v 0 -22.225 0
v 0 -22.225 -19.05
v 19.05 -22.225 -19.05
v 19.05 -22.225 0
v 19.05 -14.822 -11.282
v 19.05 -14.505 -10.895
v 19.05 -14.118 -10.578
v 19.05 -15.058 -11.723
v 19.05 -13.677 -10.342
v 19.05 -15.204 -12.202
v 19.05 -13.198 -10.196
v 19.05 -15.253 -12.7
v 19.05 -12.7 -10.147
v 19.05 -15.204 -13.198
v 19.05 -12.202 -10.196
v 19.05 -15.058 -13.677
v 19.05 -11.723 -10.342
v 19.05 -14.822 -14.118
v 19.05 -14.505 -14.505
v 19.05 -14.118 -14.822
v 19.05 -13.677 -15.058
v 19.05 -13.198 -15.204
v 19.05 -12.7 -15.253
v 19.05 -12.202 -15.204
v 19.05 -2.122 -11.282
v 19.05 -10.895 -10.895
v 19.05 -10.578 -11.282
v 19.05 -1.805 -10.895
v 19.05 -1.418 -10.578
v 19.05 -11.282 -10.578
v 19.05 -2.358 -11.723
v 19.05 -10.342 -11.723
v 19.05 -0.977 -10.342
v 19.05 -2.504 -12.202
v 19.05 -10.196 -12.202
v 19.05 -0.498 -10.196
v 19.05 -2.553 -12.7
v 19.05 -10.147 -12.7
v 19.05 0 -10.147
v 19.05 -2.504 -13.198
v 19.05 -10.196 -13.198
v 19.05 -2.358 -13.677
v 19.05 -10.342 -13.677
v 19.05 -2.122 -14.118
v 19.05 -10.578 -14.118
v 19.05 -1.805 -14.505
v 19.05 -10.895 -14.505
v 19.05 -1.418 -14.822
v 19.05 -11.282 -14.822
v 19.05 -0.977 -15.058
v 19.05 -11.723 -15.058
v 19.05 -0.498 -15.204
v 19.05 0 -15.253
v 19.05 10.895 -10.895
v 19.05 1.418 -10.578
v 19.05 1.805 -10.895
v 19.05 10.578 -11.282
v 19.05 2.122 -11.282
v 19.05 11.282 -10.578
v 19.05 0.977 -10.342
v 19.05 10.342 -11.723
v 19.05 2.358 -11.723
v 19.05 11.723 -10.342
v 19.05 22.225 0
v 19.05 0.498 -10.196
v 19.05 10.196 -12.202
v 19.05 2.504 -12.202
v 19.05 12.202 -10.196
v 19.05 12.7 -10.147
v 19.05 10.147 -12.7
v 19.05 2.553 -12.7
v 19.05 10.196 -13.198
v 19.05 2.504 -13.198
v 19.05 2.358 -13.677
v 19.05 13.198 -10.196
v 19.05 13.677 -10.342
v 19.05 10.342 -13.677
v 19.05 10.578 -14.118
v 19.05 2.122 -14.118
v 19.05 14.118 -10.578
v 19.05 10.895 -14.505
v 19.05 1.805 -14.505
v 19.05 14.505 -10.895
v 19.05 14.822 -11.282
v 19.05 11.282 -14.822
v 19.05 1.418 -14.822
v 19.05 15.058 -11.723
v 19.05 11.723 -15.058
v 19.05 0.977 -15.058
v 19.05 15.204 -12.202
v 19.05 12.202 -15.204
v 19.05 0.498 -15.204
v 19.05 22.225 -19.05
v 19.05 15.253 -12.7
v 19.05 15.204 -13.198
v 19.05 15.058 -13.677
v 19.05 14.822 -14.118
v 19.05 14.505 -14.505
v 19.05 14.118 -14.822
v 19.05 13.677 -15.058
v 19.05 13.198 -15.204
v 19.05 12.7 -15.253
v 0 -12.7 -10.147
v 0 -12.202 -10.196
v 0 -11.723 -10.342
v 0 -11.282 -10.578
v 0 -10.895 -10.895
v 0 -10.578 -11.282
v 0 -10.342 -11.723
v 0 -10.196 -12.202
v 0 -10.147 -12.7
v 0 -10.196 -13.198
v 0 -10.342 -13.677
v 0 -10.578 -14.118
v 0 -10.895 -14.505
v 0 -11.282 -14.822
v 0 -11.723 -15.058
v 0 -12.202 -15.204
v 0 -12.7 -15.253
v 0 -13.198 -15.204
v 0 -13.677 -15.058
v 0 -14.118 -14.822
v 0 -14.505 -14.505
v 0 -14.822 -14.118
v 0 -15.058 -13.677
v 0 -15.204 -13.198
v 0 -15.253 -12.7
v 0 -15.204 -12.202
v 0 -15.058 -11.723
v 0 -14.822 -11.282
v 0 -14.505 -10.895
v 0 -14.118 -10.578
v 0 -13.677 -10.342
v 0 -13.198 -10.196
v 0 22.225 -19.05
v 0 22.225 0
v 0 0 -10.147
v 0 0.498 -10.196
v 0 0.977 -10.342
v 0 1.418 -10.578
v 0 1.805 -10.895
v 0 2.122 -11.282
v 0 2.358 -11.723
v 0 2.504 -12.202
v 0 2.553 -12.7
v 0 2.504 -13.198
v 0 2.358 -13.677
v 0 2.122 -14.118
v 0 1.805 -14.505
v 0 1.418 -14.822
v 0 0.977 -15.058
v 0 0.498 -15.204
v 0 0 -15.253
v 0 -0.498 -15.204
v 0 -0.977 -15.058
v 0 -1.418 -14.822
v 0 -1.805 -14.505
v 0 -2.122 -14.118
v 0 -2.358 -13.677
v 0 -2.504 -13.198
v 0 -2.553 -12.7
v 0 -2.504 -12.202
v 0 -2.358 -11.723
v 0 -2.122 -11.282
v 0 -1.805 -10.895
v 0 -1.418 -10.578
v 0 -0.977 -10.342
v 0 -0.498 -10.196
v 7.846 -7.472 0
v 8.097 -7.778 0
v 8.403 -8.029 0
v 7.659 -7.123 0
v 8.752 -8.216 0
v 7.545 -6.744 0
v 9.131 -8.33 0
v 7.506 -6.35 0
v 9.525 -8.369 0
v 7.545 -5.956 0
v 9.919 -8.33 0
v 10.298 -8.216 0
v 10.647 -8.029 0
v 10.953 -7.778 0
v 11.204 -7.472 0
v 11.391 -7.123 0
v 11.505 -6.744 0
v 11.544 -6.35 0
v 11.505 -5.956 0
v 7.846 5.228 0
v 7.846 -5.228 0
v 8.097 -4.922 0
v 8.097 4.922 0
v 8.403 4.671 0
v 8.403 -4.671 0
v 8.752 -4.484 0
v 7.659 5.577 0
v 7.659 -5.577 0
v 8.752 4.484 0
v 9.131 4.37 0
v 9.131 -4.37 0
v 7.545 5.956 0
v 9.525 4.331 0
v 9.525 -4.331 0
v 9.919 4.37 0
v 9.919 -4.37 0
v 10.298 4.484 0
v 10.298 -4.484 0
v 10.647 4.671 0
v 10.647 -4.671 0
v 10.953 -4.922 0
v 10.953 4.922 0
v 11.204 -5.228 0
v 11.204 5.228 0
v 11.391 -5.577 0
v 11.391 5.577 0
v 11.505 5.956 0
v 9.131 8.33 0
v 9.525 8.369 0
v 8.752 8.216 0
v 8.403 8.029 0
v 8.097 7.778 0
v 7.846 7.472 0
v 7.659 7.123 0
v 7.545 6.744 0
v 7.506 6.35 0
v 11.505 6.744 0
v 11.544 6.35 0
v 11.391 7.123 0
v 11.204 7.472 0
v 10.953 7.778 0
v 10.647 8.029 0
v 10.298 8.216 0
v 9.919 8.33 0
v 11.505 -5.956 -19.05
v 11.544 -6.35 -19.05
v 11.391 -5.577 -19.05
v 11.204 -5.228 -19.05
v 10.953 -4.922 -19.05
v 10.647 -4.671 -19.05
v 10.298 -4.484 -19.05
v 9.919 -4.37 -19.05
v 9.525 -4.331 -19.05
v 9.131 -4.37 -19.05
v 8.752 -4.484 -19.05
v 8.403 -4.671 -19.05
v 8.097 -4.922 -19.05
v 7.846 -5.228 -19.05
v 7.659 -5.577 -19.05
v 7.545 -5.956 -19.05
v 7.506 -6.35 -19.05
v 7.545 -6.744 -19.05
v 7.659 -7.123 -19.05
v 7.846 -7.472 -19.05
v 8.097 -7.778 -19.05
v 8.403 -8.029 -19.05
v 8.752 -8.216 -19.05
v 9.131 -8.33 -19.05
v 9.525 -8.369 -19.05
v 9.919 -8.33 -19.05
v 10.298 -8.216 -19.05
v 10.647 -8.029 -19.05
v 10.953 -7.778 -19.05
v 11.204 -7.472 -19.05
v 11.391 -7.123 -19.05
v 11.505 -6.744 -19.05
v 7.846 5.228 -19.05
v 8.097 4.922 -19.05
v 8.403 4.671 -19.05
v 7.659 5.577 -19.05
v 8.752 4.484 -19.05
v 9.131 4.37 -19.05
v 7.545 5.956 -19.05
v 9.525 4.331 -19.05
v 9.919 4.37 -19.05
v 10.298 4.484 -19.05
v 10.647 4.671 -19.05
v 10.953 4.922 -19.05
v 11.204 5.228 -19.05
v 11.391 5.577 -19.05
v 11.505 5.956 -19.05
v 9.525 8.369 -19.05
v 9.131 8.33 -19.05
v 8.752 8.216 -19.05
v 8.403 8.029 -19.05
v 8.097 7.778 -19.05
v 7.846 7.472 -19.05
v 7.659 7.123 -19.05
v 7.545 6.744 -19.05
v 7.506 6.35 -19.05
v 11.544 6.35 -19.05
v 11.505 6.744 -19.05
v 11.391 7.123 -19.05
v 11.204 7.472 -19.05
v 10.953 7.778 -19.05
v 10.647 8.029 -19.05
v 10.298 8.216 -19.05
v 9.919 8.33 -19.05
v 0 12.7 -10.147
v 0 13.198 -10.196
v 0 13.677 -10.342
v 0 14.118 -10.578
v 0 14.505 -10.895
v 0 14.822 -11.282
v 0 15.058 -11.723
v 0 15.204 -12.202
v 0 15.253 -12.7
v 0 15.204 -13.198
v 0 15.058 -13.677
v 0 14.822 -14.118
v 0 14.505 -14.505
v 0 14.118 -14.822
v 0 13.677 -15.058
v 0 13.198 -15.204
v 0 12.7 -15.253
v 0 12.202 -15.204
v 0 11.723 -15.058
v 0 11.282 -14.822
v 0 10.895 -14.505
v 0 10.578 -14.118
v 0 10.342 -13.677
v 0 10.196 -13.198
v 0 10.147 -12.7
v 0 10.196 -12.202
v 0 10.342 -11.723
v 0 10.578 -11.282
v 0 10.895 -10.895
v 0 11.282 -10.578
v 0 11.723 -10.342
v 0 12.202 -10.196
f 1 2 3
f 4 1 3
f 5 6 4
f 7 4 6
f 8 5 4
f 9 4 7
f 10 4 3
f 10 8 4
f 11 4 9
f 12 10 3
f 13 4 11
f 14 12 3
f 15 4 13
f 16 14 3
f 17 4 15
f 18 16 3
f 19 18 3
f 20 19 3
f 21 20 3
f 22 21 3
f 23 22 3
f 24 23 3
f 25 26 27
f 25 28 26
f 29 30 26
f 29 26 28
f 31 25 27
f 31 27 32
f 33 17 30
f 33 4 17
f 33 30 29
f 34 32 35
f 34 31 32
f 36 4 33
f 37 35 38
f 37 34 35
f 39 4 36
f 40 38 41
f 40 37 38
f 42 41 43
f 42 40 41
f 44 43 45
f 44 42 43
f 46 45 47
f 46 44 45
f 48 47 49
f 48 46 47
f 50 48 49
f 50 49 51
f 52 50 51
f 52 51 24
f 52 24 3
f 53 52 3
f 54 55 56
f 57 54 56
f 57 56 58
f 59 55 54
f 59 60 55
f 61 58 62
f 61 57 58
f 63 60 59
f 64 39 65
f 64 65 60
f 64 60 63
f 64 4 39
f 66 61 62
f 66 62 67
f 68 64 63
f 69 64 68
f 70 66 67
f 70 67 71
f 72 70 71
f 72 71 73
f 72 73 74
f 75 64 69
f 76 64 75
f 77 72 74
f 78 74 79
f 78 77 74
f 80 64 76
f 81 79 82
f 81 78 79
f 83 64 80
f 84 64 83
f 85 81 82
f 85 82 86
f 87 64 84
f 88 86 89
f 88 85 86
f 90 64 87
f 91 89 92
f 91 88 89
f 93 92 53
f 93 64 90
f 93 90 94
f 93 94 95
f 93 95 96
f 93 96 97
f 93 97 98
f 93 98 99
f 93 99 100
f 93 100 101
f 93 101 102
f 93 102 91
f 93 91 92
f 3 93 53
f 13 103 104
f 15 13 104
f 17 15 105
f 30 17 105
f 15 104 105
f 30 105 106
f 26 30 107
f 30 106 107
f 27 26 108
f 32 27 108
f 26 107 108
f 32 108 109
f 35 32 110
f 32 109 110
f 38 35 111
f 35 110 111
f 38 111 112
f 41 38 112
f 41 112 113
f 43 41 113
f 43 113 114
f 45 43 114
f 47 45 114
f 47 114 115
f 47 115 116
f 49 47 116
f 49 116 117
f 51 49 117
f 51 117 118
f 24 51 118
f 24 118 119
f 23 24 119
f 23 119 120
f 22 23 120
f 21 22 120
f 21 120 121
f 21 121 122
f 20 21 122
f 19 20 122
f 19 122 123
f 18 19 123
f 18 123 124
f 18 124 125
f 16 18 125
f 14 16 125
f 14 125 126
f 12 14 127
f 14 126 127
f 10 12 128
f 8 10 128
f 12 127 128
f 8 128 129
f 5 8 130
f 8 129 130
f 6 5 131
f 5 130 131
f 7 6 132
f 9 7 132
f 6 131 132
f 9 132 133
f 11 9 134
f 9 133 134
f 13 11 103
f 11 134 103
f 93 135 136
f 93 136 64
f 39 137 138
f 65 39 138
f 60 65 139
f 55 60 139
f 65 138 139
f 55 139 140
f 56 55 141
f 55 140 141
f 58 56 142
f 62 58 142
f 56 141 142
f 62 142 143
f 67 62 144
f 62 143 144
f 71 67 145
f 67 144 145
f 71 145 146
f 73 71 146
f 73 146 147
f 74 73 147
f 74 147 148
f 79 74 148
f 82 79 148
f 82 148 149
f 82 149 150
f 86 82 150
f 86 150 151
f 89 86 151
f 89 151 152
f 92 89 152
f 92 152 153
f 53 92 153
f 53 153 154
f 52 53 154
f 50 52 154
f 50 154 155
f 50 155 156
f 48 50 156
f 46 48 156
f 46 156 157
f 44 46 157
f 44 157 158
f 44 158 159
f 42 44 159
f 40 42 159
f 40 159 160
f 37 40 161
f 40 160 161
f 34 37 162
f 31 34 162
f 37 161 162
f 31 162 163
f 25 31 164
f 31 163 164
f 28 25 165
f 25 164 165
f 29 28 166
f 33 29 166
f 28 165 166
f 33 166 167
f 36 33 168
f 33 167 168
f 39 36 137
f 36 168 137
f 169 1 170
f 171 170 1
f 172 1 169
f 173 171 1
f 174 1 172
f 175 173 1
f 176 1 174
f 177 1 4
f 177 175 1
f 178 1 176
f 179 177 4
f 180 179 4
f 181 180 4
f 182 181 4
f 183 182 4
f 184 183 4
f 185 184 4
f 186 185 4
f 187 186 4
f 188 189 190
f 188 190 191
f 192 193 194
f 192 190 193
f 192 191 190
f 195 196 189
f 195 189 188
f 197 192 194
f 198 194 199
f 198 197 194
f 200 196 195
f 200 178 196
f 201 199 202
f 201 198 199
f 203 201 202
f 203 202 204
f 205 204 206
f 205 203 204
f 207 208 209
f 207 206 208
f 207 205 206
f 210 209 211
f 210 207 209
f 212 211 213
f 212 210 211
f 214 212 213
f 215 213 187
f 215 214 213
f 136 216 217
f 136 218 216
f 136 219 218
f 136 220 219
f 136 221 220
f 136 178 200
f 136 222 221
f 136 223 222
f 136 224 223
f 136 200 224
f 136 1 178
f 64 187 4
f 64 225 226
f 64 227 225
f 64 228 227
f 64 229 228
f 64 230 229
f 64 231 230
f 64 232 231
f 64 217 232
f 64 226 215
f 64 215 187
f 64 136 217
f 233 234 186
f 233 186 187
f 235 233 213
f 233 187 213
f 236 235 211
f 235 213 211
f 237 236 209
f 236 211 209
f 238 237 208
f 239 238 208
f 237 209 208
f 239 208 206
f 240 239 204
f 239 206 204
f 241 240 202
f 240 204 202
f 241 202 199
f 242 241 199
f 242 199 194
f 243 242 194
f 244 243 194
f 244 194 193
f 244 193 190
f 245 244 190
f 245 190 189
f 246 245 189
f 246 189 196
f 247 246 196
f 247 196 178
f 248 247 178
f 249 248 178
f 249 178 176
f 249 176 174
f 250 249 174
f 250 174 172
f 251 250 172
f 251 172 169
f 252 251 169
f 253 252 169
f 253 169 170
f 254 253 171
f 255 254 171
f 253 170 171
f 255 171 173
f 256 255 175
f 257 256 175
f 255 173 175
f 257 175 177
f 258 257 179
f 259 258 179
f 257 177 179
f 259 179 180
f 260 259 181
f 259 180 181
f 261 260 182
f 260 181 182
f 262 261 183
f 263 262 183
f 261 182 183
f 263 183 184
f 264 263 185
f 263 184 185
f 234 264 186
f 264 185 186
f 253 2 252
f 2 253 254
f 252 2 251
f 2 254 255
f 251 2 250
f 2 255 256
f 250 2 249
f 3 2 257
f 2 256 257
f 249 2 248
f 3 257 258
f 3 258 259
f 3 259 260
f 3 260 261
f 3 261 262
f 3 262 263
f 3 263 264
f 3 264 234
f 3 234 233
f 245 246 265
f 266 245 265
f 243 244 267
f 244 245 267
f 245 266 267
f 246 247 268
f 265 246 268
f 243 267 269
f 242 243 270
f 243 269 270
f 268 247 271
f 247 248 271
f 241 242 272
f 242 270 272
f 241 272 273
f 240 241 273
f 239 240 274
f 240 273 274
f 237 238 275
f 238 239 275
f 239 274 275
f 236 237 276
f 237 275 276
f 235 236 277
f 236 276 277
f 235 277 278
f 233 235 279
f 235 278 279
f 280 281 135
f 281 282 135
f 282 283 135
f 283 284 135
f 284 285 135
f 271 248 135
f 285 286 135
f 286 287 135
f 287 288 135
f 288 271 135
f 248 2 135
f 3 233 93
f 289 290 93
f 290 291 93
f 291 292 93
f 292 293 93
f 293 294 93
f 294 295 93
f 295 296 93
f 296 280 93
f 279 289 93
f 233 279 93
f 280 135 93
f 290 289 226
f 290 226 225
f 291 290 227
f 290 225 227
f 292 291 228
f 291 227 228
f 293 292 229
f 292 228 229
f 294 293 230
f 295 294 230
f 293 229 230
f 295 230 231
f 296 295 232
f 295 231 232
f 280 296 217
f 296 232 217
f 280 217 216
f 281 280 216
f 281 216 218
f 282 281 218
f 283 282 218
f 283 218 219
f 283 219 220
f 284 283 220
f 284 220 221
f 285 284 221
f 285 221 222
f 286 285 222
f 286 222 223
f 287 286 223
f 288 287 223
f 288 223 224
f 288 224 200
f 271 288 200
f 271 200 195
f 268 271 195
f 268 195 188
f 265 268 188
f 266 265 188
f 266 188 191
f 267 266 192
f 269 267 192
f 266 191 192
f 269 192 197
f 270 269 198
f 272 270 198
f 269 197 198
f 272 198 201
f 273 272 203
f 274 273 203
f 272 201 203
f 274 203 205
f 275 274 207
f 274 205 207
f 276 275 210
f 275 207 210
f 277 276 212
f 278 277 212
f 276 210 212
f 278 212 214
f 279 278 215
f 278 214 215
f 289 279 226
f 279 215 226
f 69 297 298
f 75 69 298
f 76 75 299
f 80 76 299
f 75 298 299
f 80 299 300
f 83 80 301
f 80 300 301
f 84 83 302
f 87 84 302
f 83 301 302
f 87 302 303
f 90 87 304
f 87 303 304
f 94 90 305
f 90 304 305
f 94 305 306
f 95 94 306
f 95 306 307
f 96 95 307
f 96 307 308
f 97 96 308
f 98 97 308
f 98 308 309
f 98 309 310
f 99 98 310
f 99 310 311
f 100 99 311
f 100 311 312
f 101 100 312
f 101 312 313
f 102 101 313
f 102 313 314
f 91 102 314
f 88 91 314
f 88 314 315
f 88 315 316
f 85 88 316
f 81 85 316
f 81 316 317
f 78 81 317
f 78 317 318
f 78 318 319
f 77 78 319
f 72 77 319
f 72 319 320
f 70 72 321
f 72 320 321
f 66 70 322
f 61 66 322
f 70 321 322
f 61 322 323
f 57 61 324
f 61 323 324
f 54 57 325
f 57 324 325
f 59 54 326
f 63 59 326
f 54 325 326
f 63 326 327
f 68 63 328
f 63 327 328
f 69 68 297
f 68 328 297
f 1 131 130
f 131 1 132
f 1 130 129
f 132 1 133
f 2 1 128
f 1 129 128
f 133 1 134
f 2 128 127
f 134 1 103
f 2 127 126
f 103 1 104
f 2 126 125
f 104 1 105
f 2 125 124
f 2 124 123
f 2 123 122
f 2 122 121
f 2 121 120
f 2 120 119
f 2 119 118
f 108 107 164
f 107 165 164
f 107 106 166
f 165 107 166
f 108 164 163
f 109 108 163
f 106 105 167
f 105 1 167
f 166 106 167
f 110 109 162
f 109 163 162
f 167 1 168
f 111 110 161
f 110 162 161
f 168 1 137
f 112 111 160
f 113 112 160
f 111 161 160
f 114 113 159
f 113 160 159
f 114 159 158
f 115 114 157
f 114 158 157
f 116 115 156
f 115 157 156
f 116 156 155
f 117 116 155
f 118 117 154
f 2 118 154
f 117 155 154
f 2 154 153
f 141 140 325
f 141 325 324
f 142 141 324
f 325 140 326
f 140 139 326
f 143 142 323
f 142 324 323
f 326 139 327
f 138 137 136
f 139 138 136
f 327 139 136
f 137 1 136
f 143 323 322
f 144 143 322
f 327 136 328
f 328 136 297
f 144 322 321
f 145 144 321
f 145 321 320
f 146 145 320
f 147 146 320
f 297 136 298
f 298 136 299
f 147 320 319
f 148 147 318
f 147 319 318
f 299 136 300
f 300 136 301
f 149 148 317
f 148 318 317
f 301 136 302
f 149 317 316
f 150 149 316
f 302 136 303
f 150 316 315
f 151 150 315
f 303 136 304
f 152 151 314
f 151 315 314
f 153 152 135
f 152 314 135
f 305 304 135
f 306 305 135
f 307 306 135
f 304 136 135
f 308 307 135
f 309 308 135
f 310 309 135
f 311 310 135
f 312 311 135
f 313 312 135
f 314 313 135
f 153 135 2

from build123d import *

# Parameters (mm, degrees)
SKETCH1_W              = 19.05
SKETCH1_H              = 19.05
BOSS_EXTRUDE1_DEPTH    = 22.225
SKETCH2_R              = 2.5527
CUT_EXTRUDE1_DEPTH     = 35.925
F_10_32_TAPPED_HOLE1_D = 4.0386


with BuildPart() as part:
    # Sketch1 → Boss-Extrude1 (new, symmetric)
    with BuildSketch(Plane(origin=(0, 0, 0), x_dir=(1, 0, 0), z_dir=(0, 1, 0))):
        with Locations((9.525, 9.525)):
            Rectangle(SKETCH1_W, SKETCH1_H)
    extrude(amount=BOSS_EXTRUDE1_DEPTH, both=True)

    # Sketch2 → Cut-Extrude1 (cut, through all)
    with BuildSketch(Plane.ZY):
        with Locations((-12.7, 12.7)):
            Circle(SKETCH2_R)
        with Locations((-12.7, -12.7)):
            Circle(SKETCH2_R)
        with Locations((-12.7, 0)):
            Circle(SKETCH2_R)
    extrude(amount=-CUT_EXTRUDE1_DEPTH, mode=Mode.SUBTRACT)

    # #10-32 Tapped Hole1 (through all)
    with Locations(Plane(origin=(9.525, -6.35, -19.05), x_dir=(-1, 0, 0), z_dir=(0, 0, -1))):
        with Locations((0, 0), (0, 12.7)):
            Hole(F_10_32_TAPPED_HOLE1_D / 2)


solid = part.part
